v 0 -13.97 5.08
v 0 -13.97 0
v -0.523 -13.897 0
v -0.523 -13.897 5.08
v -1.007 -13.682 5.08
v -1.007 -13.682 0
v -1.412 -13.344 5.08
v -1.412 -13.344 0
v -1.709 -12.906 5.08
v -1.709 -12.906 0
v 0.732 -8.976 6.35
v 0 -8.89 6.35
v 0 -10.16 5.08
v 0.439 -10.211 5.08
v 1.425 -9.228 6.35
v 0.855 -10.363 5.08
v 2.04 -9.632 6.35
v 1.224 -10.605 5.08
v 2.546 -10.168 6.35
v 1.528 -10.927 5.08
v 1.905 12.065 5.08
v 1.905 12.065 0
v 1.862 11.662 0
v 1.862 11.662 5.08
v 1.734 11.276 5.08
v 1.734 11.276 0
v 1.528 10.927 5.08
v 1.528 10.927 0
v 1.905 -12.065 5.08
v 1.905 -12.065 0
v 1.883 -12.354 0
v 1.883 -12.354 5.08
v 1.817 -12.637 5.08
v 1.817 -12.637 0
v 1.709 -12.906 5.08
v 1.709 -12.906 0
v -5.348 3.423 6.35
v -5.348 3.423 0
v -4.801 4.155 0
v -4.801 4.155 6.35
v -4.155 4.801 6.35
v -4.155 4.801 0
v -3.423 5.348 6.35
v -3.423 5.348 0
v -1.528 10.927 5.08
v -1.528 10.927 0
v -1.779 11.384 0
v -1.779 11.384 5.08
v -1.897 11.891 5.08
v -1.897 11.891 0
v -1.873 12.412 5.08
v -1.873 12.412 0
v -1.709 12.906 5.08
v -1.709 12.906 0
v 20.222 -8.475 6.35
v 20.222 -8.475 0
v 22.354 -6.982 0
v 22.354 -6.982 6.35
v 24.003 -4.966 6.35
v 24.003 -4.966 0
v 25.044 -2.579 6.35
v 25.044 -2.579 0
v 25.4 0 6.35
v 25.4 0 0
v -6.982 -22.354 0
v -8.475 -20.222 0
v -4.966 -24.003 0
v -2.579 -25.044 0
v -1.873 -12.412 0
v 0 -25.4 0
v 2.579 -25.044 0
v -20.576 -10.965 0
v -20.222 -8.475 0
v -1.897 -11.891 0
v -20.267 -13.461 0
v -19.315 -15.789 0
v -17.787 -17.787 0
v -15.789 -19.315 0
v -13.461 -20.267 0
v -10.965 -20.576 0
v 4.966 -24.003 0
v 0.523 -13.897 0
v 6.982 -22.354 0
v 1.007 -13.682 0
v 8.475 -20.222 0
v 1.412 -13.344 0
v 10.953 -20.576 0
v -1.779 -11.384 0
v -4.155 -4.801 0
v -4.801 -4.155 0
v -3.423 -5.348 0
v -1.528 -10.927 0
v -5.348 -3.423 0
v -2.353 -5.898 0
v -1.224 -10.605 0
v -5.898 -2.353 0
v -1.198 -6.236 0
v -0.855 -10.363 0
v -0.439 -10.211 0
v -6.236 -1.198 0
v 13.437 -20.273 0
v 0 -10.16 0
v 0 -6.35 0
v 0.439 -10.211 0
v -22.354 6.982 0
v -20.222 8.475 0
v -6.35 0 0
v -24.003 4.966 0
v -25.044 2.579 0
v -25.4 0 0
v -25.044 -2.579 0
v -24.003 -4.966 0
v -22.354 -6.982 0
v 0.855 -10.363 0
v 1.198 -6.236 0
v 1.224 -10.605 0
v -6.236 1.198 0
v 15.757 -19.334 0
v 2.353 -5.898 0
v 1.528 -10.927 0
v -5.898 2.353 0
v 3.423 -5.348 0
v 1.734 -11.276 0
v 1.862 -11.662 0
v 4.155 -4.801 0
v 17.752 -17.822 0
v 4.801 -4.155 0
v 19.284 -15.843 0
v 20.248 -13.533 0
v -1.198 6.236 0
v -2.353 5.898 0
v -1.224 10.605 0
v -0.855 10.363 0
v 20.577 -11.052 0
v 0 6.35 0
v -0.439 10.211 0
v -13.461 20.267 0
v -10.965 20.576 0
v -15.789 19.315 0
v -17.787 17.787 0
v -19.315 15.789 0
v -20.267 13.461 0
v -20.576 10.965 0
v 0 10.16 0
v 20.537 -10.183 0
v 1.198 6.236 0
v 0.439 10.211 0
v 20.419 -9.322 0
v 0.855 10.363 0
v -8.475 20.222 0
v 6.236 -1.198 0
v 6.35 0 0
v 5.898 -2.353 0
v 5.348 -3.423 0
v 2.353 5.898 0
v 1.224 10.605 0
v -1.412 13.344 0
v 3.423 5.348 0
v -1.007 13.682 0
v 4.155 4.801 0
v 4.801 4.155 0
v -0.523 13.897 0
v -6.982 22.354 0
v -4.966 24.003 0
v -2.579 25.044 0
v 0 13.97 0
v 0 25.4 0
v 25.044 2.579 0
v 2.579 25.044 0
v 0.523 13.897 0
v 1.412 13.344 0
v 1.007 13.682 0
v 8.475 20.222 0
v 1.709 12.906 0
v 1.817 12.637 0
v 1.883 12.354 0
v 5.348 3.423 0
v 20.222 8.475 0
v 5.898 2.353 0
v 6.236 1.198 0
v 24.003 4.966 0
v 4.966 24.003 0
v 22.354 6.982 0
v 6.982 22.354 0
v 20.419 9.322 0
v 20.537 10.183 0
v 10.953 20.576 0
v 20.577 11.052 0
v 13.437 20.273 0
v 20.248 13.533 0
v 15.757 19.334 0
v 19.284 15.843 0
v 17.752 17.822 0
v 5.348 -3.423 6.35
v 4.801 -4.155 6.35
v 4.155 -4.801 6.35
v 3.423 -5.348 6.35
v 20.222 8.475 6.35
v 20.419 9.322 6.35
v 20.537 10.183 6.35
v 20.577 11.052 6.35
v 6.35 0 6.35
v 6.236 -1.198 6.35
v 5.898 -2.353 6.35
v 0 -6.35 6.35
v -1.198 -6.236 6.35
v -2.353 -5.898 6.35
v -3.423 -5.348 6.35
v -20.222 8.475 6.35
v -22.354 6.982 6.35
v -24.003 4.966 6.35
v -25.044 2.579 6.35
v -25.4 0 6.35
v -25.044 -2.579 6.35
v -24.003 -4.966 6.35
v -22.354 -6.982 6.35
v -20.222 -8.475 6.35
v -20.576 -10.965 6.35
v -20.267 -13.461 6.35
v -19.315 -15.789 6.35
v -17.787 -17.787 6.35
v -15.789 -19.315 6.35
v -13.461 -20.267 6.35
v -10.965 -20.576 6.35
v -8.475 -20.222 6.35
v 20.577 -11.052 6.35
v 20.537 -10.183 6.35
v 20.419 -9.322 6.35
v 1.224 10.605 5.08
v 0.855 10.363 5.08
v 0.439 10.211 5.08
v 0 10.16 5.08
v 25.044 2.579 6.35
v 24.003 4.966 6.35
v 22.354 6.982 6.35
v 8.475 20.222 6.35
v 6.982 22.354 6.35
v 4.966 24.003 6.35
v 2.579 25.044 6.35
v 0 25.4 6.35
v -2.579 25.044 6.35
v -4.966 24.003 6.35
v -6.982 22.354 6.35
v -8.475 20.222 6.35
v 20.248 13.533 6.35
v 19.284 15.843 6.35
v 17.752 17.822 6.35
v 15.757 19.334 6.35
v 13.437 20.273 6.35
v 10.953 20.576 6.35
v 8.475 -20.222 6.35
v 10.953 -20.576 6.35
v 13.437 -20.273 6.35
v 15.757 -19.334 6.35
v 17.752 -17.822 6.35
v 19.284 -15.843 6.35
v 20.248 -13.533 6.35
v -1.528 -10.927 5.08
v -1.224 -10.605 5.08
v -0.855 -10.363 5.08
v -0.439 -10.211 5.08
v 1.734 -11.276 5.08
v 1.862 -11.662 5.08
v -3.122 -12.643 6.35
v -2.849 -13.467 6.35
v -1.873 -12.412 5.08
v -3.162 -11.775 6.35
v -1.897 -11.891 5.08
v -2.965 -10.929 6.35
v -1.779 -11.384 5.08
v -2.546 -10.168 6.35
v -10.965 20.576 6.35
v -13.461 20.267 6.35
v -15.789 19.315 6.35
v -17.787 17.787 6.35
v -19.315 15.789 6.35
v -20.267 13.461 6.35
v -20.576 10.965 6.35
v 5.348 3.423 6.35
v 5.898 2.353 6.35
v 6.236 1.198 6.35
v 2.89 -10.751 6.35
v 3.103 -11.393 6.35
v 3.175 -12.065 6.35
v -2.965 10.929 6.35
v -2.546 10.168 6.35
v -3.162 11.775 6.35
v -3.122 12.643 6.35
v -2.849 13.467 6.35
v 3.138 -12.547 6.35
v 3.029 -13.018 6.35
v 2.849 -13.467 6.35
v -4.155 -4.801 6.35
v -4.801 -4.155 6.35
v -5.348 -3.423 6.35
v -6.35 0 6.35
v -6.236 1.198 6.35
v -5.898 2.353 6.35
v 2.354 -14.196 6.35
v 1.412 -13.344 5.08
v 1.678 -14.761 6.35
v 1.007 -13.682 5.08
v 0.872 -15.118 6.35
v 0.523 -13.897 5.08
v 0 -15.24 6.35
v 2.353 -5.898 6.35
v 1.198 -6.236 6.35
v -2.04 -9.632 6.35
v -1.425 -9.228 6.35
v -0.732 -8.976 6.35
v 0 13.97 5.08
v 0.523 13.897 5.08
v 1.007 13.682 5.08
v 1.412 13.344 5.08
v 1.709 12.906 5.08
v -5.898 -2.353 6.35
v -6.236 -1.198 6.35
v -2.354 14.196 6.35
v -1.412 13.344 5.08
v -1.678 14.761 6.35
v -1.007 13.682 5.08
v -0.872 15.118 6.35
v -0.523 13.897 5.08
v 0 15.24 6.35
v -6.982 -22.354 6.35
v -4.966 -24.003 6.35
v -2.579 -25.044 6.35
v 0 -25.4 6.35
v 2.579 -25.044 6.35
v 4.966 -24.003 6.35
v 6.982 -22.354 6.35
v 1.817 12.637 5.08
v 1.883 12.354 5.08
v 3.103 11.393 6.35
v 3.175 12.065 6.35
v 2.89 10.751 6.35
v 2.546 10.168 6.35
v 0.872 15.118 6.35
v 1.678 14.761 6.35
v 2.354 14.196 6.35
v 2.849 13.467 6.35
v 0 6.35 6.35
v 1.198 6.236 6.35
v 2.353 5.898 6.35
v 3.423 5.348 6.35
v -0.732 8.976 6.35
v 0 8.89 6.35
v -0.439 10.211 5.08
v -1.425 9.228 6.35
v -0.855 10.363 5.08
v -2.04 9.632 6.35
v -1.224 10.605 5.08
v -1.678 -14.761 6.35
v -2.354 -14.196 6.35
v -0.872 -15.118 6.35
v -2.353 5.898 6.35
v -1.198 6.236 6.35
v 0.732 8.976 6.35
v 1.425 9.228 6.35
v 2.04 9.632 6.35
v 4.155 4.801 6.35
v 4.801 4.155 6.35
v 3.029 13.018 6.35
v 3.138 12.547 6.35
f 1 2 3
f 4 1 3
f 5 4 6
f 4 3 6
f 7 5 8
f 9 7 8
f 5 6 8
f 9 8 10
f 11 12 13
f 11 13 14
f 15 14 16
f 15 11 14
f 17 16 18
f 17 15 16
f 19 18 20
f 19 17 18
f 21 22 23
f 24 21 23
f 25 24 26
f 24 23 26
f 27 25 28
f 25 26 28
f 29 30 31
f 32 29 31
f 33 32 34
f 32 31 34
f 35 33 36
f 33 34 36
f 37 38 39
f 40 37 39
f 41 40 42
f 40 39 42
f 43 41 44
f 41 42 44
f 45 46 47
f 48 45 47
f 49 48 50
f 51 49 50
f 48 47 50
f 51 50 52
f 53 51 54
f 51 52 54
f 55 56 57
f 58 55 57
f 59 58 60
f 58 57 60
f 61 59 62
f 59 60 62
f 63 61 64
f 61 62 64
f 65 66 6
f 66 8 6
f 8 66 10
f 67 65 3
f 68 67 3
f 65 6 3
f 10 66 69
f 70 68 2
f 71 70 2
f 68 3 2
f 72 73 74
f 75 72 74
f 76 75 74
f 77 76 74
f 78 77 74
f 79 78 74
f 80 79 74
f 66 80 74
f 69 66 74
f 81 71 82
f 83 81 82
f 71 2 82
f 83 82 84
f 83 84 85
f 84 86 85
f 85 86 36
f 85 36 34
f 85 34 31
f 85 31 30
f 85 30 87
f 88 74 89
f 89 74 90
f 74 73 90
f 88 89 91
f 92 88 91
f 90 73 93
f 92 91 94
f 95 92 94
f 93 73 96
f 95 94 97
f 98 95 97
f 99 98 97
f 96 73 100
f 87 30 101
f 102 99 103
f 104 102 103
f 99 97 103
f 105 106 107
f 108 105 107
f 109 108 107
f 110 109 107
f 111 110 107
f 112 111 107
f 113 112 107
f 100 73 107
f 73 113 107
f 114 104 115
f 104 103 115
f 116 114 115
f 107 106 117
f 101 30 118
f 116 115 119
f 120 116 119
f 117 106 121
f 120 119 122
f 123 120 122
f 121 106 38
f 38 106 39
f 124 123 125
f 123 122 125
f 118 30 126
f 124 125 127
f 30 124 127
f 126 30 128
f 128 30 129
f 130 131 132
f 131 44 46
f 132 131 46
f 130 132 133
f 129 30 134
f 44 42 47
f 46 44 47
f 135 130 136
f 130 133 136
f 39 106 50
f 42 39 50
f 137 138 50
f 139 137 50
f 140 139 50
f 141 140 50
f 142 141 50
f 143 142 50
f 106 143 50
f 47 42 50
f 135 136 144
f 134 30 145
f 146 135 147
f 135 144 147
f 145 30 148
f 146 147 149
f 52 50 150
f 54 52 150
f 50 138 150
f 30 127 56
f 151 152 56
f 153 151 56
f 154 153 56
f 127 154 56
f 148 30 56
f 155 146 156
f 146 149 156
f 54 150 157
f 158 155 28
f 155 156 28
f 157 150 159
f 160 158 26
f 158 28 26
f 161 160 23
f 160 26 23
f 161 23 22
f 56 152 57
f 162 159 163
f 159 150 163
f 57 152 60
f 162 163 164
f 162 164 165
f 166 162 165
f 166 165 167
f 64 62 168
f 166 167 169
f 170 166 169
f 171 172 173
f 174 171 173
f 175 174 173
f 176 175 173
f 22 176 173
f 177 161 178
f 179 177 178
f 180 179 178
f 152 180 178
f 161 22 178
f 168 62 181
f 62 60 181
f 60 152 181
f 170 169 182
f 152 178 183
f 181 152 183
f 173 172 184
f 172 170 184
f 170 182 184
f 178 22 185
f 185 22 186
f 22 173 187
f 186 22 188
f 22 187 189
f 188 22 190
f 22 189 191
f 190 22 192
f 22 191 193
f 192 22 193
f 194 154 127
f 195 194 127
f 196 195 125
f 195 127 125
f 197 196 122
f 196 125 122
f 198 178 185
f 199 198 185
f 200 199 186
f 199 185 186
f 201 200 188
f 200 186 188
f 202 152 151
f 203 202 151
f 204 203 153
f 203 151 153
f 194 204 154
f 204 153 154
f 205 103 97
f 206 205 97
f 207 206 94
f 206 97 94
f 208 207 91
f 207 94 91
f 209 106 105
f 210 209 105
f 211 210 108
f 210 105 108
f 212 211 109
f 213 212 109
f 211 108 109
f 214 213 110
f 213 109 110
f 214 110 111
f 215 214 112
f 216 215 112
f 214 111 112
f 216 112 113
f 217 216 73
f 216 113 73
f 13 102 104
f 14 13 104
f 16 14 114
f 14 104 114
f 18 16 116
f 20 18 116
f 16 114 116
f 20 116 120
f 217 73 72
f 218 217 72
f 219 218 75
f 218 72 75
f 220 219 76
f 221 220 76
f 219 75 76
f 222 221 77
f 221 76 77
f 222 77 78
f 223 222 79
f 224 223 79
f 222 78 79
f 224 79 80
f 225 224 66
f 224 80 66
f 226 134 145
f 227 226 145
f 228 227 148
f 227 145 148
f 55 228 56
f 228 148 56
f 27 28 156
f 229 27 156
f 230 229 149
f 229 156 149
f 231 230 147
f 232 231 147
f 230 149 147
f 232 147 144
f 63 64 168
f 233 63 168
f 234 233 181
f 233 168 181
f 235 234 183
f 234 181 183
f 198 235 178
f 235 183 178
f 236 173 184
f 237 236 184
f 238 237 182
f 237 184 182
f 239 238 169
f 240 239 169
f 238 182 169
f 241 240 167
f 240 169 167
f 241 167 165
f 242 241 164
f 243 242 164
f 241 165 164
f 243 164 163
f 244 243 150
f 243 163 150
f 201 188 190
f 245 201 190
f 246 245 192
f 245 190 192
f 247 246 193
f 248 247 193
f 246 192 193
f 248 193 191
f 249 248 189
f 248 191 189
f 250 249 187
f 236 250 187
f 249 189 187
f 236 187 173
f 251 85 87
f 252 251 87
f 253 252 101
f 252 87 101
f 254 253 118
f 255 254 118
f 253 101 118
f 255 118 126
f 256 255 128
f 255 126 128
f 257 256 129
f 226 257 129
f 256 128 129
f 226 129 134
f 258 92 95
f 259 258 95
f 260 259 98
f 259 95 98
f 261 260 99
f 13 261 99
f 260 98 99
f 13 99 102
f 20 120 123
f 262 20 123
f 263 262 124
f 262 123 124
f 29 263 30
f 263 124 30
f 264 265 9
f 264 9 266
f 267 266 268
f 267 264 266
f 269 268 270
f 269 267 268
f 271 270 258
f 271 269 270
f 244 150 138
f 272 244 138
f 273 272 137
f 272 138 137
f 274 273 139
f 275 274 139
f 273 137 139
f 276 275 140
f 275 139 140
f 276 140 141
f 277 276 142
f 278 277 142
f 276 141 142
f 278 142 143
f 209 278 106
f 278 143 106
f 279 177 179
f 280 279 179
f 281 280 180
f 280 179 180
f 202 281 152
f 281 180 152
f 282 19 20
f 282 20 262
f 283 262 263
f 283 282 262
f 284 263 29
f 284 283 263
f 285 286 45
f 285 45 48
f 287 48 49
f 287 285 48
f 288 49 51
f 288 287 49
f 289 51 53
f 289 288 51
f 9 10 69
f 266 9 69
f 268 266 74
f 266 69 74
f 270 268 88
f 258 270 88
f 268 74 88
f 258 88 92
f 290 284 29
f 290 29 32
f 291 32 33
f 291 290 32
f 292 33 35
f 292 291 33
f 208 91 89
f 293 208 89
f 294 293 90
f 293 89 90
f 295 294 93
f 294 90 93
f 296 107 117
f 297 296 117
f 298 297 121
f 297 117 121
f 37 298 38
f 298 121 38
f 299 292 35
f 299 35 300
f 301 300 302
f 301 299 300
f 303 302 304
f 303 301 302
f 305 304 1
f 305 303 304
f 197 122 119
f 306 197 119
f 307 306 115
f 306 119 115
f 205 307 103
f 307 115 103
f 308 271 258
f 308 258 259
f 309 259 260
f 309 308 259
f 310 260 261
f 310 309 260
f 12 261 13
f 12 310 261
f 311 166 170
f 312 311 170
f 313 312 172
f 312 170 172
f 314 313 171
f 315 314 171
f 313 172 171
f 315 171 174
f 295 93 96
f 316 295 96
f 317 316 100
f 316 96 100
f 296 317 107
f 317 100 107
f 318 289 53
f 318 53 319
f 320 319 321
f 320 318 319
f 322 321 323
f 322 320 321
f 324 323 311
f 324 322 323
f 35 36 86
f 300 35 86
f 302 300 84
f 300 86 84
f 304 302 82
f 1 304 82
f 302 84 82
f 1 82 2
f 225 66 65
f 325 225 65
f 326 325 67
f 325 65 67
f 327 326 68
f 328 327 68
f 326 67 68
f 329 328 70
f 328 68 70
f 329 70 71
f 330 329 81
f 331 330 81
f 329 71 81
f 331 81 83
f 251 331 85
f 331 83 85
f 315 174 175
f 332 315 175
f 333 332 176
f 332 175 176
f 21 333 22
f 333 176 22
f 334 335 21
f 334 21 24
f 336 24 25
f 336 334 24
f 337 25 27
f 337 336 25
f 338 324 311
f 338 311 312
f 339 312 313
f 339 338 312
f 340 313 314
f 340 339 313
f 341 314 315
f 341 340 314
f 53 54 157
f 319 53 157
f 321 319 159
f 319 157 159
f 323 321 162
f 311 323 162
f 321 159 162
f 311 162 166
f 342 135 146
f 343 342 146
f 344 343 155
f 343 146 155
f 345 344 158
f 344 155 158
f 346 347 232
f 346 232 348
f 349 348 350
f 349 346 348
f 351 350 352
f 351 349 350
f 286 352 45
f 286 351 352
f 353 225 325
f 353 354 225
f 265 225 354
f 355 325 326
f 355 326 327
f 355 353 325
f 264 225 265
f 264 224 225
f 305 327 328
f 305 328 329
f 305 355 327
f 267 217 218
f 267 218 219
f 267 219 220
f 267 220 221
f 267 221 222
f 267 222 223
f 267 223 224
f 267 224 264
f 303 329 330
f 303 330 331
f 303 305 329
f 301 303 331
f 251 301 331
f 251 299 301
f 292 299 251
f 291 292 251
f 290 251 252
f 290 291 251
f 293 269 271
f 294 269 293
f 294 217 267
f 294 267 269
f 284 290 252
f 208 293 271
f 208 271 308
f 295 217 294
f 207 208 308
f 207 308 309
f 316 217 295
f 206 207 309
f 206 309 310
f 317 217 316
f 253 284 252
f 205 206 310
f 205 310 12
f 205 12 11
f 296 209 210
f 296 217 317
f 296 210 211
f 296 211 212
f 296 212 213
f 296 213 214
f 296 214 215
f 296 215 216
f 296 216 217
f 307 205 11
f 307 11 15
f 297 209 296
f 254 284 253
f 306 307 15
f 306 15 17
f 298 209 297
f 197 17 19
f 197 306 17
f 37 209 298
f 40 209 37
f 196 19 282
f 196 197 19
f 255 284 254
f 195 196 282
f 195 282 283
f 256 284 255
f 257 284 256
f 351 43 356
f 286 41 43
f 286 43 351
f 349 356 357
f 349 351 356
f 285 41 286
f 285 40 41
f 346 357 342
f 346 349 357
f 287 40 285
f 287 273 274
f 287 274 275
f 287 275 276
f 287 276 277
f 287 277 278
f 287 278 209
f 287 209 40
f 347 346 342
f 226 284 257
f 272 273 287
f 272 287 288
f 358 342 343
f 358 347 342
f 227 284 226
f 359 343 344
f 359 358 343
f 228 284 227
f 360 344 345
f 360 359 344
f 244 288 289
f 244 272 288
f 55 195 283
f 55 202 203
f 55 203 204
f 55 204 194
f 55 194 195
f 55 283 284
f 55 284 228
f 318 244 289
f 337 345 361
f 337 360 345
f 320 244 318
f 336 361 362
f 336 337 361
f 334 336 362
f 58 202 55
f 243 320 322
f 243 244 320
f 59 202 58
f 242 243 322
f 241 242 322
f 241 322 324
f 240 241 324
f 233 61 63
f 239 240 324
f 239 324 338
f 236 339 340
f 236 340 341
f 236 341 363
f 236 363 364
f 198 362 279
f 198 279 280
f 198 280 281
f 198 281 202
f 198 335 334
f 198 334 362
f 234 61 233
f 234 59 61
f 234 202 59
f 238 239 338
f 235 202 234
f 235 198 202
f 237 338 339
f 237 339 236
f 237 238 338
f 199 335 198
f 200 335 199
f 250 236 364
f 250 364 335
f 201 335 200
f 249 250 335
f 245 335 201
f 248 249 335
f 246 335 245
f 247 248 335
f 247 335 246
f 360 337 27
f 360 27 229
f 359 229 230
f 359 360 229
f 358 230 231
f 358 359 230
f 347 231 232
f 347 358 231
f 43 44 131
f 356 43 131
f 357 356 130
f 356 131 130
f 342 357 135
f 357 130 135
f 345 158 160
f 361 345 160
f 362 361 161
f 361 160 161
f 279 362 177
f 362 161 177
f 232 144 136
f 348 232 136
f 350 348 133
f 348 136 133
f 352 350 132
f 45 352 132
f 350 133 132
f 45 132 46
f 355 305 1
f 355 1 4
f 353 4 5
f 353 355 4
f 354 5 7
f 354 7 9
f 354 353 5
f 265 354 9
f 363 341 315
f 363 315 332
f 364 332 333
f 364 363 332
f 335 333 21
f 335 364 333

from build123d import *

# Parameters (mm, degrees)
F1_DEPTH = 6.35
F2_SIZE  = 1.27


with BuildPart() as f1:
    # F0 (on Top) → F1 (new body)
    with BuildSketch(Plane.XY):
        with BuildLine():
            Line((9.0862708935, 13.0175), (13.0175, 9.0862708935))
            ThreePointArc((13.0175, 9.0862708935), (11.2253201513, 11.2253201513), (9.0862708935, 13.0175))
        make_face()
        with BuildLine():
            ThreePointArc((20.221779693, 8.4753248493), (16.6798616454, 9.4909337123), (13.0175, 9.0862708935))
            ThreePointArc((13.0175, 9.0862708935), (14.680846164, 6.0405613073), (15.6426389263, 2.7061914978))
            ThreePointArc((15.6426389263, 2.7061914978), (18.5124203716, 5.1302265884), (20.221779693, 8.4753248493))
        make_face()
        with BuildLine():
            ThreePointArc((9.0862708935, 13.0175), (11.2253201513, 11.2253201513), (13.0175, 9.0862708935))
            ThreePointArc((13.0175, 9.0862708935), (16.6798616454, 9.4909337123), (20.221779693, 8.4753248493))
            ThreePointArc((20.221779693, 8.4753248493), (20.4876913926, 9.751427392), (20.5768854467, 11.0518854467))
            ThreePointArc((20.5768854467, 11.0518854467), (16.8044451078, 18.6435705262), (8.4753248493, 20.221779693))
            ThreePointArc((8.4753248493, 20.221779693), (9.2588631643, 18.1108617814), (9.525, 15.875))
            ThreePointArc((9.525, 15.875), (9.4146788384, 14.4295079143), (9.0862708935, 13.0175))
        make_face()
        with BuildLine():
            ThreePointArc((15.6426389263, 2.7061914978), (14.680846164, 6.0405613073), (13.0175, 9.0862708935))
            ThreePointArc((13.0175, 9.0862708935), (9.0369714008, 6.6307608822), (6.7051057537, 2.5765605975))
            ThreePointArc((6.7051057537, 2.5765605975), (11.1900224972, 1.5278871711), (15.6426389263, 2.7061914978))
        make_face()
        with BuildLine():
            ThreePointArc((6.7051057537, 2.5765605975), (9.0369714008, 6.6307608822), (13.0175, 9.0862708935))
            Line((13.0175, 9.0862708935), (9.0862708935, 13.0175))
            ThreePointArc((9.0862708935, 13.0175), (6.6307608822, 9.0369714008), (2.5765605975, 6.7051057537))
            ThreePointArc((2.5765605975, 6.7051057537), (2.9714834378, 6.0087982599), (3.4234793231, 5.3481108183))
            ThreePointArc((3.4234793231, 5.3481108183), (4.4901280605, 4.4901280605), (5.3481108183, 3.4234793231))
            ThreePointArc((5.3481108183, 3.4234793231), (6.0087982599, 2.9714834378), (6.7051057537, 2.5765605975))
        make_face()
        with BuildLine():
            ThreePointArc((2.5765605975, 6.7051057537), (6.6307608822, 9.0369714008), (9.0862708935, 13.0175))
            ThreePointArc((9.0862708935, 13.0175), (6.0405613073, 14.680846164), (2.7061914978, 15.6426389263))
            ThreePointArc((2.7061914978, 15.6426389263), (2.1024733841, 14.3128130347), (1.7091513138, 12.9063244241))
            ThreePointArc((1.7091513138, 12.9063244241), (1.8553919064, 12.4969095665), (1.905, 12.065))
            ThreePointArc((1.905, 12.065), (1.8082177094, 11.465522131), (1.5277047607, 10.9269564313))
            ThreePointArc((1.5277047607, 10.9269564313), (1.8078843831, 8.7553512461), (2.5765605975, 6.7051057537))
        make_face()
        with BuildLine():
            ThreePointArc((2.7061914978, 15.6426389263), (6.0405613073, 14.680846164), (9.0862708935, 13.0175))
            ThreePointArc((9.0862708935, 13.0175), (9.4146788384, 14.4295079143), (9.525, 15.875))
            ThreePointArc((9.525, 15.875), (9.2588631643, 18.1108617814), (8.4753248493, 20.221779693))
            ThreePointArc((8.4753248493, 20.221779693), (5.1302265884, 18.5124203716), (2.7061914978, 15.6426389263))
        make_face()
        with BuildLine():
            ThreePointArc((20.221779693, 8.4753248493), (18.5124203716, 5.1302265884), (15.6426389263, 2.7061914978))
            ThreePointArc((15.6426389263, 2.7061914978), (15.8168030581, 1.3580743804), (15.875, 0))
            ThreePointArc((15.875, 0), (15.8168030581, -1.3580743804), (15.6426389263, -2.7061914978))
            ThreePointArc((15.6426389263, -2.7061914978), (18.5124203716, -5.1302265884), (20.221779693, -8.4753248493))
            ThreePointArc((20.221779693, -8.4753248493), (24.0029979569, -4.9660119021), (25.4, 0))
            ThreePointArc((25.4, 0), (24.0029979569, 4.9660119021), (20.221779693, 8.4753248493))
        make_face()
        with BuildLine():
            ThreePointArc((15.875, 0), (15.8168030581, 1.3580743804), (15.6426389263, 2.7061914978))
            ThreePointArc((15.6426389263, 2.7061914978), (11.1900224972, 1.5278871711), (6.7051057537, 2.5765605975))
            ThreePointArc((6.7051057537, 2.5765605975), (6.4391940541, 1.3004580548), (6.35, 0))
            Line((6.35, 0), (15.875, 0))
        make_face()
        with BuildLine():
            ThreePointArc((6.35, 0), (6.4391940541, 1.3004580548), (6.7051057537, 2.5765605975))
            ThreePointArc((6.7051057537, 2.5765605975), (6.0087982599, 2.9714834378), (5.3481108183, 3.4234793231))
            ThreePointArc((5.3481108183, 3.4234793231), (6.0943828111, 1.783535296), (6.35, 0))
        make_face()
        with BuildLine():
            ThreePointArc((1.7091513138, 12.9063244241), (2.1024733841, 14.3128130347), (2.7061914978, 15.6426389263))
            ThreePointArc((2.7061914978, 15.6426389263), (1.3580743804, 15.8168030581), (0, 15.875))
            Line((0, 15.875), (0, 13.97))
            ThreePointArc((0, 13.97), (1.0065540155, 13.6823663821), (1.7091513138, 12.9063244241))
        make_face()
        with BuildLine():
            ThreePointArc((0, 15.875), (1.3580743804, 15.8168030581), (2.7061914978, 15.6426389263))
            ThreePointArc((2.7061914978, 15.6426389263), (5.1302265884, 18.5124203716), (8.4753248493, 20.221779693))
            ThreePointArc((8.4753248493, 20.221779693), (0, 25.4), (-8.4753248493, 20.221779693))
            ThreePointArc((-8.4753248493, 20.221779693), (-5.1302265884, 18.5124203716), (-2.7061914978, 15.6426389263))
            ThreePointArc((-2.7061914978, 15.6426389263), (-1.3580743804, 15.8168030581), (0, 15.875))
        make_face()
        with BuildLine():
            ThreePointArc((3.4234793231, 5.3481108183), (2.9714834378, 6.0087982599), (2.5765605975, 6.7051057537))
            ThreePointArc((2.5765605975, 6.7051057537), (1.3004580548, 6.4391940541), (0, 6.35))
            ThreePointArc((0, 6.35), (1.783535296, 6.0943828111), (3.4234793231, 5.3481108183))
        make_face()
        with BuildLine():
            ThreePointArc((0, 6.35), (1.3004580548, 6.4391940541), (2.5765605975, 6.7051057537))
            ThreePointArc((2.5765605975, 6.7051057537), (1.8078843831, 8.7553512461), (1.5277047607, 10.9269564313))
            ThreePointArc((1.5277047607, 10.9269564313), (0.8547081378, 10.3625021295), (0, 10.16))
            Line((0, 10.16), (0, 6.35))
        make_face()
        with BuildLine():
            ThreePointArc((15.6426389263, -2.7061914978), (15.8168030581, -1.3580743804), (15.875, 0))
            Line((15.875, 0), (6.35, 0))
            ThreePointArc((6.35, 0), (6.4391940541, -1.3004580548), (6.7051057537, -2.5765605975))
            ThreePointArc((6.7051057537, -2.5765605975), (11.1900224972, -1.5278871711), (15.6426389263, -2.7061914978))
        make_face()
        with BuildLine():
            ThreePointArc((6.7051057537, -2.5765605975), (6.4391940541, -1.3004580548), (6.35, 0))
            ThreePointArc((6.35, 0), (6.0943828111, -1.783535296), (5.3481108183, -3.4234793231))
            ThreePointArc((5.3481108183, -3.4234793231), (6.0087982599, -2.9714834378), (6.7051057537, -2.5765605975))
        make_face()
        with BuildLine():
            Line((0, 13.97), (0, 15.875))
            ThreePointArc((0, 15.875), (-1.3580743804, 15.8168030581), (-2.7061914978, 15.6426389263))
            ThreePointArc((-2.7061914978, 15.6426389263), (-2.1024733841, 14.3128130347), (-1.7091513138, 12.9063244241))
            ThreePointArc((-1.7091513138, 12.9063244241), (-1.0065540155, 13.6823663821), (0, 13.97))
        make_face()
        with BuildLine():
            ThreePointArc((-2.5765605975, 6.7051057537), (-1.3004580548, 6.4391940541), (0, 6.35))
            Line((0, 6.35), (0, 10.16))
            ThreePointArc((0, 10.16), (-0.8547081378, 10.3625021295), (-1.5277047607, 10.9269564313))
            ThreePointArc((-1.5277047607, 10.9269564313), (-1.8078843831, 8.7553512461), (-2.5765605975, 6.7051057537))
        make_face()
        with BuildLine():
            ThreePointArc((-3.4234793231, 5.3481108183), (-1.783535296, 6.0943828111), (0, 6.35))
            ThreePointArc((0, 6.35), (-1.3004580548, 6.4391940541), (-2.5765605975, 6.7051057537))
            ThreePointArc((-2.5765605975, 6.7051057537), (-2.9714834378, 6.0087982599), (-3.4234793231, 5.3481108183))
        make_face()
        with BuildLine():
            ThreePointArc((20.221779693, -8.4753248493), (18.5124203716, -5.1302265884), (15.6426389263, -2.7061914978))
            ThreePointArc((15.6426389263, -2.7061914978), (14.680846164, -6.0405613073), (13.0175, -9.0862708935))
            ThreePointArc((13.0175, -9.0862708935), (16.6798616454, -9.4909337123), (20.221779693, -8.4753248493))
        make_face()
        with BuildLine():
            ThreePointArc((13.0175, -9.0862708935), (14.680846164, -6.0405613073), (15.6426389263, -2.7061914978))
            ThreePointArc((15.6426389263, -2.7061914978), (11.1900224972, -1.5278871711), (6.7051057537, -2.5765605975))
            ThreePointArc((6.7051057537, -2.5765605975), (9.0369714008, -6.6307608822), (13.0175, -9.0862708935))
        make_face()
        with BuildLine():
            ThreePointArc((20.5768854467, -11.0518854467), (20.4876913926, -9.751427392), (20.221779693, -8.4753248493))
            ThreePointArc((20.221779693, -8.4753248493), (16.6798616454, -9.4909337123), (13.0175, -9.0862708935))
            ThreePointArc((13.0175, -9.0862708935), (11.2253201513, -11.2253201513), (9.0862708935, -13.0175))
            ThreePointArc((9.0862708935, -13.0175), (9.4146788384, -14.4295079143), (9.525, -15.875))
            ThreePointArc((9.525, -15.875), (9.2588631643, -18.1108617814), (8.4753248493, -20.221779693))
            ThreePointArc((8.4753248493, -20.221779693), (16.8044451078, -18.6435705262), (20.5768854467, -11.0518854467))
        make_face()
        with BuildLine():
            ThreePointArc((13.0175, -9.0862708935), (9.0369714008, -6.6307608822), (6.7051057537, -2.5765605975))
            ThreePointArc((6.7051057537, -2.5765605975), (6.0087982599, -2.9714834378), (5.3481108183, -3.4234793231))
            ThreePointArc((5.3481108183, -3.4234793231), (4.4901280605, -4.4901280605), (3.4234793231, -5.3481108183))
            ThreePointArc((3.4234793231, -5.3481108183), (2.9714834378, -6.0087982599), (2.5765605975, -6.7051057537))
            ThreePointArc((2.5765605975, -6.7051057537), (6.6307608822, -9.0369714008), (9.0862708935, -13.0175))
            Line((9.0862708935, -13.0175), (13.0175, -9.0862708935))
        make_face()
        with BuildLine():
            ThreePointArc((-1.7091513138, 12.9063244241), (-2.1024733841, 14.3128130347), (-2.7061914978, 15.6426389263))
            ThreePointArc((-2.7061914978, 15.6426389263), (-6.0405613073, 14.680846164), (-9.0862708935, 13.0175))
            ThreePointArc((-9.0862708935, 13.0175), (-6.6307608822, 9.0369714008), (-2.5765605975, 6.7051057537))
            ThreePointArc((-2.5765605975, 6.7051057537), (-1.8078843831, 8.7553512461), (-1.5277047607, 10.9269564313))
            ThreePointArc((-1.5277047607, 10.9269564313), (-1.8970460523, 11.8910998114), (-1.7091513138, 12.9063244241))
        make_face()
        with BuildLine():
            ThreePointArc((-9.0862708935, 13.0175), (-6.0405613073, 14.680846164), (-2.7061914978, 15.6426389263))
            ThreePointArc((-2.7061914978, 15.6426389263), (-5.1302265884, 18.5124203716), (-8.4753248493, 20.221779693))
            ThreePointArc((-8.4753248493, 20.221779693), (-9.4909337123, 16.6798616454), (-9.0862708935, 13.0175))
        make_face()
        with BuildLine():
            ThreePointArc((-9.0862708935, 13.0175), (-9.4909337123, 16.6798616454), (-8.4753248493, 20.221779693))
            ThreePointArc((-8.4753248493, 20.221779693), (-17.7870775376, 17.7870775376), (-20.221779693, 8.4753248493))
            ThreePointArc((-20.221779693, 8.4753248493), (-16.6798616454, 9.4909337123), (-13.0175, 9.0862708935))
            ThreePointArc((-13.0175, 9.0862708935), (-11.2253201513, 11.2253201513), (-9.0862708935, 13.0175))
        make_face()
        with BuildLine():
            ThreePointArc((-3.4234793231, 5.3481108183), (-2.9714834378, 6.0087982599), (-2.5765605975, 6.7051057537))
            ThreePointArc((-2.5765605975, 6.7051057537), (-6.6307608822, 9.0369714008), (-9.0862708935, 13.0175))
            Line((-9.0862708935, 13.0175), (-13.0175, 9.0862708935))
            ThreePointArc((-13.0175, 9.0862708935), (-9.0369714008, 6.6307608822), (-6.7051057537, 2.5765605975))
            ThreePointArc((-6.7051057537, 2.5765605975), (-6.0087982599, 2.9714834378), (-5.3481108183, 3.4234793231))
            ThreePointArc((-5.3481108183, 3.4234793231), (-4.4901280605, 4.4901280605), (-3.4234793231, 5.3481108183))
        make_face()
        with BuildLine():
            ThreePointArc((9.0862708935, -13.0175), (11.2253201513, -11.2253201513), (13.0175, -9.0862708935))
            Line((13.0175, -9.0862708935), (9.0862708935, -13.0175))
        make_face()
        with BuildLine():
            ThreePointArc((2.5765605975, -6.7051057537), (1.3004580548, -6.4391940541), (0, -6.35))
            Line((0, -6.35), (0, -10.16))
            ThreePointArc((0, -10.16), (0.8547081378, -10.3625021295), (1.5277047607, -10.9269564313))
            ThreePointArc((1.5277047607, -10.9269564313), (1.8078843831, -8.7553512461), (2.5765605975, -6.7051057537))
        make_face()
        with BuildLine():
            ThreePointArc((3.4234793231, -5.3481108183), (1.783535296, -6.0943828111), (0, -6.35))
            ThreePointArc((0, -6.35), (1.3004580548, -6.4391940541), (2.5765605975, -6.7051057537))
            ThreePointArc((2.5765605975, -6.7051057537), (2.9714834378, -6.0087982599), (3.4234793231, -5.3481108183))
        make_face()
        with BuildLine():
            Line((0, -10.16), (0, -6.35))
            ThreePointArc((0, -6.35), (-1.3004580548, -6.4391940541), (-2.5765605975, -6.7051057537))
            ThreePointArc((-2.5765605975, -6.7051057537), (-1.8078843831, -8.7553512461), (-1.5277047607, -10.9269564313))
            ThreePointArc((-1.5277047607, -10.9269564313), (-0.8547081378, -10.3625021295), (0, -10.16))
        make_face()
        with BuildLine():
            ThreePointArc((-2.5765605975, -6.7051057537), (-1.3004580548, -6.4391940541), (0, -6.35))
            ThreePointArc((0, -6.35), (-1.783535296, -6.0943828111), (-3.4234793231, -5.3481108183))
            ThreePointArc((-3.4234793231, -5.3481108183), (-2.9714834378, -6.0087982599), (-2.5765605975, -6.7051057537))
        make_face()
        with BuildLine():
            ThreePointArc((-6.7051057537, -2.5765605975), (-6.4391940541, -1.3004580548), (-6.35, 0))
            Line((-6.35, 0), (-15.875, 0))
            ThreePointArc((-15.875, 0), (-15.8168030581, -1.3580743804), (-15.6426389263, -2.7061914978))
            ThreePointArc((-15.6426389263, -2.7061914978), (-11.1900224972, -1.5278871711), (-6.7051057537, -2.5765605975))
        make_face()
        with BuildLine():
            Line((-15.875, 0), (-6.35, 0))
            ThreePointArc((-6.35, 0), (-6.4391940541, 1.3004580548), (-6.7051057537, 2.5765605975))
            ThreePointArc((-6.7051057537, 2.5765605975), (-11.1900224972, 1.5278871711), (-15.6426389263, 2.7061914978))
            ThreePointArc((-15.6426389263, 2.7061914978), (-15.8168030581, 1.3580743804), (-15.875, 0))
        make_face()
        with BuildLine():
            ThreePointArc((-5.3481108183, -3.4234793231), (-6.0943828111, -1.783535296), (-6.35, 0))
            ThreePointArc((-6.35, 0), (-6.4391940541, -1.3004580548), (-6.7051057537, -2.5765605975))
            ThreePointArc((-6.7051057537, -2.5765605975), (-6.0087982599, -2.9714834378), (-5.3481108183, -3.4234793231))
        make_face()
        with BuildLine():
            ThreePointArc((-6.7051057537, 2.5765605975), (-6.4391940541, 1.3004580548), (-6.35, 0))
            ThreePointArc((-6.35, 0), (-6.0943828111, 1.783535296), (-5.3481108183, 3.4234793231))
            ThreePointArc((-5.3481108183, 3.4234793231), (-6.0087982599, 2.9714834378), (-6.7051057537, 2.5765605975))
        make_face()
        with BuildLine():
            Line((-13.0175, 9.0862708935), (-9.0862708935, 13.0175))
            ThreePointArc((-9.0862708935, 13.0175), (-11.2253201513, 11.2253201513), (-13.0175, 9.0862708935))
        make_face()
        with BuildLine():
            ThreePointArc((-15.6426389263, 2.7061914978), (-18.5124203716, 5.1302265884), (-20.221779693, 8.4753248493))
            ThreePointArc((-20.221779693, 8.4753248493), (-25.4, 0), (-20.221779693, -8.4753248493))
            ThreePointArc((-20.221779693, -8.4753248493), (-18.5124203716, -5.1302265884), (-15.6426389263, -2.7061914978))
            ThreePointArc((-15.6426389263, -2.7061914978), (-15.8168030581, -1.3580743804), (-15.875, 0))
            ThreePointArc((-15.875, 0), (-15.8168030581, 1.3580743804), (-15.6426389263, 2.7061914978))
        make_face()
        with BuildLine():
            ThreePointArc((-13.0175, 9.0862708935), (-16.6798616454, 9.4909337123), (-20.221779693, 8.4753248493))
            ThreePointArc((-20.221779693, 8.4753248493), (-18.5124203716, 5.1302265884), (-15.6426389263, 2.7061914978))
            ThreePointArc((-15.6426389263, 2.7061914978), (-14.680846164, 6.0405613073), (-13.0175, 9.0862708935))
        make_face()
        with BuildLine():
            ThreePointArc((9.525, -15.875), (9.4146788384, -14.4295079143), (9.0862708935, -13.0175))
            ThreePointArc((9.0862708935, -13.0175), (6.0405613073, -14.680846164), (2.7061914978, -15.6426389263))
            ThreePointArc((2.7061914978, -15.6426389263), (5.1302265884, -18.5124203716), (8.4753248493, -20.221779693))
            ThreePointArc((8.4753248493, -20.221779693), (9.2588631643, -18.1108617814), (9.525, -15.875))
        make_face()
        with BuildLine():
            ThreePointArc((2.7061914978, -15.6426389263), (6.0405613073, -14.680846164), (9.0862708935, -13.0175))
            ThreePointArc((9.0862708935, -13.0175), (6.6307608822, -9.0369714008), (2.5765605975, -6.7051057537))
            ThreePointArc((2.5765605975, -6.7051057537), (1.8078843831, -8.7553512461), (1.5277047607, -10.9269564313))
            ThreePointArc((1.5277047607, -10.9269564313), (1.8082177094, -11.465522131), (1.905, -12.065))
            ThreePointArc((1.905, -12.065), (1.8553919064, -12.4969095665), (1.7091513138, -12.9063244241))
            ThreePointArc((1.7091513138, -12.9063244241), (2.1024733841, -14.3128130347), (2.7061914978, -15.6426389263))
        make_face()
        with BuildLine():
            ThreePointArc((-8.4753248493, -20.221779693), (0, -25.4), (8.4753248493, -20.221779693))
            ThreePointArc((8.4753248493, -20.221779693), (5.1302265884, -18.5124203716), (2.7061914978, -15.6426389263))
            ThreePointArc((2.7061914978, -15.6426389263), (1.3580743804, -15.8168030581), (0, -15.875))
            ThreePointArc((0, -15.875), (-1.3580743804, -15.8168030581), (-2.7061914978, -15.6426389263))
            ThreePointArc((-2.7061914978, -15.6426389263), (-5.1302265884, -18.5124203716), (-8.4753248493, -20.221779693))
        make_face()
        with BuildLine():
            ThreePointArc((-1.5277047607, -10.9269564313), (-1.8078843831, -8.7553512461), (-2.5765605975, -6.7051057537))
            ThreePointArc((-2.5765605975, -6.7051057537), (-6.6307608822, -9.0369714008), (-9.0862708935, -13.0175))
            ThreePointArc((-9.0862708935, -13.0175), (-6.0405613073, -14.680846164), (-2.7061914978, -15.6426389263))
            ThreePointArc((-2.7061914978, -15.6426389263), (-2.1024733841, -14.3128130347), (-1.7091513138, -12.9063244241))
            ThreePointArc((-1.7091513138, -12.9063244241), (-1.8970460523, -11.8910998114), (-1.5277047607, -10.9269564313))
        make_face()
        with BuildLine():
            ThreePointArc((-9.0862708935, -13.0175), (-6.6307608822, -9.0369714008), (-2.5765605975, -6.7051057537))
            ThreePointArc((-2.5765605975, -6.7051057537), (-2.9714834378, -6.0087982599), (-3.4234793231, -5.3481108183))
            ThreePointArc((-3.4234793231, -5.3481108183), (-4.4901280605, -4.4901280605), (-5.3481108183, -3.4234793231))
            ThreePointArc((-5.3481108183, -3.4234793231), (-6.0087982599, -2.9714834378), (-6.7051057537, -2.5765605975))
            ThreePointArc((-6.7051057537, -2.5765605975), (-9.0369714008, -6.6307608822), (-13.0175, -9.0862708935))
            Line((-13.0175, -9.0862708935), (-9.0862708935, -13.0175))
        make_face()
        with BuildLine():
            ThreePointArc((-15.6426389263, 2.7061914978), (-11.1900224972, 1.5278871711), (-6.7051057537, 2.5765605975))
            ThreePointArc((-6.7051057537, 2.5765605975), (-9.0369714008, 6.6307608822), (-13.0175, 9.0862708935))
            ThreePointArc((-13.0175, 9.0862708935), (-14.680846164, 6.0405613073), (-15.6426389263, 2.7061914978))
        make_face()
        with BuildLine():
            ThreePointArc((-13.0175, -9.0862708935), (-9.0369714008, -6.6307608822), (-6.7051057537, -2.5765605975))
            ThreePointArc((-6.7051057537, -2.5765605975), (-11.1900224972, -1.5278871711), (-15.6426389263, -2.7061914978))
            ThreePointArc((-15.6426389263, -2.7061914978), (-14.680846164, -6.0405613073), (-13.0175, -9.0862708935))
        make_face()
        with BuildLine():
            ThreePointArc((-15.6426389263, -2.7061914978), (-18.5124203716, -5.1302265884), (-20.221779693, -8.4753248493))
            ThreePointArc((-20.221779693, -8.4753248493), (-16.6798616454, -9.4909337123), (-13.0175, -9.0862708935))
            ThreePointArc((-13.0175, -9.0862708935), (-14.680846164, -6.0405613073), (-15.6426389263, -2.7061914978))
        make_face()
        with BuildLine():
            ThreePointArc((-13.0175, -9.0862708935), (-16.6798616454, -9.4909337123), (-20.221779693, -8.4753248493))
            ThreePointArc((-20.221779693, -8.4753248493), (-17.7870775376, -17.7870775376), (-8.4753248493, -20.221779693))
            ThreePointArc((-8.4753248493, -20.221779693), (-9.4909337123, -16.6798616454), (-9.0862708935, -13.0175))
            ThreePointArc((-9.0862708935, -13.0175), (-11.2253201513, -11.2253201513), (-13.0175, -9.0862708935))
        make_face()
        with BuildLine():
            ThreePointArc((0, -15.875), (1.3580743804, -15.8168030581), (2.7061914978, -15.6426389263))
            ThreePointArc((2.7061914978, -15.6426389263), (2.1024733841, -14.3128130347), (1.7091513138, -12.9063244241))
            ThreePointArc((1.7091513138, -12.9063244241), (1.0065540155, -13.6823663821), (0, -13.97))
            Line((0, -13.97), (0, -15.875))
        make_face()
        with BuildLine():
            ThreePointArc((-9.0862708935, -13.0175), (-9.4909337123, -16.6798616454), (-8.4753248493, -20.221779693))
            ThreePointArc((-8.4753248493, -20.221779693), (-5.1302265884, -18.5124203716), (-2.7061914978, -15.6426389263))
            ThreePointArc((-2.7061914978, -15.6426389263), (-6.0405613073, -14.680846164), (-9.0862708935, -13.0175))
        make_face()
        with BuildLine():
            Line((0, -15.875), (0, -13.97))
            ThreePointArc((0, -13.97), (-1.0065540155, -13.6823663821), (-1.7091513138, -12.9063244241))
            ThreePointArc((-1.7091513138, -12.9063244241), (-2.1024733841, -14.3128130347), (-2.7061914978, -15.6426389263))
            ThreePointArc((-2.7061914978, -15.6426389263), (-1.3580743804, -15.8168030581), (0, -15.875))
        make_face()
        with BuildLine():
            ThreePointArc((-13.0175, -9.0862708935), (-11.2253201513, -11.2253201513), (-9.0862708935, -13.0175))
            Line((-9.0862708935, -13.0175), (-13.0175, -9.0862708935))
        make_face()
    extrude(amount=F1_DEPTH)

    # F2
    f2_edges = [f1.edges().sort_by_distance(p)[0] for p in [
        (-1.709151, -11.223676, 6.35),
        (-1.527705, 13.203044, 6.35),
    ]]
    chamfer(f2_edges, length=F2_SIZE)


solid = f1.part
